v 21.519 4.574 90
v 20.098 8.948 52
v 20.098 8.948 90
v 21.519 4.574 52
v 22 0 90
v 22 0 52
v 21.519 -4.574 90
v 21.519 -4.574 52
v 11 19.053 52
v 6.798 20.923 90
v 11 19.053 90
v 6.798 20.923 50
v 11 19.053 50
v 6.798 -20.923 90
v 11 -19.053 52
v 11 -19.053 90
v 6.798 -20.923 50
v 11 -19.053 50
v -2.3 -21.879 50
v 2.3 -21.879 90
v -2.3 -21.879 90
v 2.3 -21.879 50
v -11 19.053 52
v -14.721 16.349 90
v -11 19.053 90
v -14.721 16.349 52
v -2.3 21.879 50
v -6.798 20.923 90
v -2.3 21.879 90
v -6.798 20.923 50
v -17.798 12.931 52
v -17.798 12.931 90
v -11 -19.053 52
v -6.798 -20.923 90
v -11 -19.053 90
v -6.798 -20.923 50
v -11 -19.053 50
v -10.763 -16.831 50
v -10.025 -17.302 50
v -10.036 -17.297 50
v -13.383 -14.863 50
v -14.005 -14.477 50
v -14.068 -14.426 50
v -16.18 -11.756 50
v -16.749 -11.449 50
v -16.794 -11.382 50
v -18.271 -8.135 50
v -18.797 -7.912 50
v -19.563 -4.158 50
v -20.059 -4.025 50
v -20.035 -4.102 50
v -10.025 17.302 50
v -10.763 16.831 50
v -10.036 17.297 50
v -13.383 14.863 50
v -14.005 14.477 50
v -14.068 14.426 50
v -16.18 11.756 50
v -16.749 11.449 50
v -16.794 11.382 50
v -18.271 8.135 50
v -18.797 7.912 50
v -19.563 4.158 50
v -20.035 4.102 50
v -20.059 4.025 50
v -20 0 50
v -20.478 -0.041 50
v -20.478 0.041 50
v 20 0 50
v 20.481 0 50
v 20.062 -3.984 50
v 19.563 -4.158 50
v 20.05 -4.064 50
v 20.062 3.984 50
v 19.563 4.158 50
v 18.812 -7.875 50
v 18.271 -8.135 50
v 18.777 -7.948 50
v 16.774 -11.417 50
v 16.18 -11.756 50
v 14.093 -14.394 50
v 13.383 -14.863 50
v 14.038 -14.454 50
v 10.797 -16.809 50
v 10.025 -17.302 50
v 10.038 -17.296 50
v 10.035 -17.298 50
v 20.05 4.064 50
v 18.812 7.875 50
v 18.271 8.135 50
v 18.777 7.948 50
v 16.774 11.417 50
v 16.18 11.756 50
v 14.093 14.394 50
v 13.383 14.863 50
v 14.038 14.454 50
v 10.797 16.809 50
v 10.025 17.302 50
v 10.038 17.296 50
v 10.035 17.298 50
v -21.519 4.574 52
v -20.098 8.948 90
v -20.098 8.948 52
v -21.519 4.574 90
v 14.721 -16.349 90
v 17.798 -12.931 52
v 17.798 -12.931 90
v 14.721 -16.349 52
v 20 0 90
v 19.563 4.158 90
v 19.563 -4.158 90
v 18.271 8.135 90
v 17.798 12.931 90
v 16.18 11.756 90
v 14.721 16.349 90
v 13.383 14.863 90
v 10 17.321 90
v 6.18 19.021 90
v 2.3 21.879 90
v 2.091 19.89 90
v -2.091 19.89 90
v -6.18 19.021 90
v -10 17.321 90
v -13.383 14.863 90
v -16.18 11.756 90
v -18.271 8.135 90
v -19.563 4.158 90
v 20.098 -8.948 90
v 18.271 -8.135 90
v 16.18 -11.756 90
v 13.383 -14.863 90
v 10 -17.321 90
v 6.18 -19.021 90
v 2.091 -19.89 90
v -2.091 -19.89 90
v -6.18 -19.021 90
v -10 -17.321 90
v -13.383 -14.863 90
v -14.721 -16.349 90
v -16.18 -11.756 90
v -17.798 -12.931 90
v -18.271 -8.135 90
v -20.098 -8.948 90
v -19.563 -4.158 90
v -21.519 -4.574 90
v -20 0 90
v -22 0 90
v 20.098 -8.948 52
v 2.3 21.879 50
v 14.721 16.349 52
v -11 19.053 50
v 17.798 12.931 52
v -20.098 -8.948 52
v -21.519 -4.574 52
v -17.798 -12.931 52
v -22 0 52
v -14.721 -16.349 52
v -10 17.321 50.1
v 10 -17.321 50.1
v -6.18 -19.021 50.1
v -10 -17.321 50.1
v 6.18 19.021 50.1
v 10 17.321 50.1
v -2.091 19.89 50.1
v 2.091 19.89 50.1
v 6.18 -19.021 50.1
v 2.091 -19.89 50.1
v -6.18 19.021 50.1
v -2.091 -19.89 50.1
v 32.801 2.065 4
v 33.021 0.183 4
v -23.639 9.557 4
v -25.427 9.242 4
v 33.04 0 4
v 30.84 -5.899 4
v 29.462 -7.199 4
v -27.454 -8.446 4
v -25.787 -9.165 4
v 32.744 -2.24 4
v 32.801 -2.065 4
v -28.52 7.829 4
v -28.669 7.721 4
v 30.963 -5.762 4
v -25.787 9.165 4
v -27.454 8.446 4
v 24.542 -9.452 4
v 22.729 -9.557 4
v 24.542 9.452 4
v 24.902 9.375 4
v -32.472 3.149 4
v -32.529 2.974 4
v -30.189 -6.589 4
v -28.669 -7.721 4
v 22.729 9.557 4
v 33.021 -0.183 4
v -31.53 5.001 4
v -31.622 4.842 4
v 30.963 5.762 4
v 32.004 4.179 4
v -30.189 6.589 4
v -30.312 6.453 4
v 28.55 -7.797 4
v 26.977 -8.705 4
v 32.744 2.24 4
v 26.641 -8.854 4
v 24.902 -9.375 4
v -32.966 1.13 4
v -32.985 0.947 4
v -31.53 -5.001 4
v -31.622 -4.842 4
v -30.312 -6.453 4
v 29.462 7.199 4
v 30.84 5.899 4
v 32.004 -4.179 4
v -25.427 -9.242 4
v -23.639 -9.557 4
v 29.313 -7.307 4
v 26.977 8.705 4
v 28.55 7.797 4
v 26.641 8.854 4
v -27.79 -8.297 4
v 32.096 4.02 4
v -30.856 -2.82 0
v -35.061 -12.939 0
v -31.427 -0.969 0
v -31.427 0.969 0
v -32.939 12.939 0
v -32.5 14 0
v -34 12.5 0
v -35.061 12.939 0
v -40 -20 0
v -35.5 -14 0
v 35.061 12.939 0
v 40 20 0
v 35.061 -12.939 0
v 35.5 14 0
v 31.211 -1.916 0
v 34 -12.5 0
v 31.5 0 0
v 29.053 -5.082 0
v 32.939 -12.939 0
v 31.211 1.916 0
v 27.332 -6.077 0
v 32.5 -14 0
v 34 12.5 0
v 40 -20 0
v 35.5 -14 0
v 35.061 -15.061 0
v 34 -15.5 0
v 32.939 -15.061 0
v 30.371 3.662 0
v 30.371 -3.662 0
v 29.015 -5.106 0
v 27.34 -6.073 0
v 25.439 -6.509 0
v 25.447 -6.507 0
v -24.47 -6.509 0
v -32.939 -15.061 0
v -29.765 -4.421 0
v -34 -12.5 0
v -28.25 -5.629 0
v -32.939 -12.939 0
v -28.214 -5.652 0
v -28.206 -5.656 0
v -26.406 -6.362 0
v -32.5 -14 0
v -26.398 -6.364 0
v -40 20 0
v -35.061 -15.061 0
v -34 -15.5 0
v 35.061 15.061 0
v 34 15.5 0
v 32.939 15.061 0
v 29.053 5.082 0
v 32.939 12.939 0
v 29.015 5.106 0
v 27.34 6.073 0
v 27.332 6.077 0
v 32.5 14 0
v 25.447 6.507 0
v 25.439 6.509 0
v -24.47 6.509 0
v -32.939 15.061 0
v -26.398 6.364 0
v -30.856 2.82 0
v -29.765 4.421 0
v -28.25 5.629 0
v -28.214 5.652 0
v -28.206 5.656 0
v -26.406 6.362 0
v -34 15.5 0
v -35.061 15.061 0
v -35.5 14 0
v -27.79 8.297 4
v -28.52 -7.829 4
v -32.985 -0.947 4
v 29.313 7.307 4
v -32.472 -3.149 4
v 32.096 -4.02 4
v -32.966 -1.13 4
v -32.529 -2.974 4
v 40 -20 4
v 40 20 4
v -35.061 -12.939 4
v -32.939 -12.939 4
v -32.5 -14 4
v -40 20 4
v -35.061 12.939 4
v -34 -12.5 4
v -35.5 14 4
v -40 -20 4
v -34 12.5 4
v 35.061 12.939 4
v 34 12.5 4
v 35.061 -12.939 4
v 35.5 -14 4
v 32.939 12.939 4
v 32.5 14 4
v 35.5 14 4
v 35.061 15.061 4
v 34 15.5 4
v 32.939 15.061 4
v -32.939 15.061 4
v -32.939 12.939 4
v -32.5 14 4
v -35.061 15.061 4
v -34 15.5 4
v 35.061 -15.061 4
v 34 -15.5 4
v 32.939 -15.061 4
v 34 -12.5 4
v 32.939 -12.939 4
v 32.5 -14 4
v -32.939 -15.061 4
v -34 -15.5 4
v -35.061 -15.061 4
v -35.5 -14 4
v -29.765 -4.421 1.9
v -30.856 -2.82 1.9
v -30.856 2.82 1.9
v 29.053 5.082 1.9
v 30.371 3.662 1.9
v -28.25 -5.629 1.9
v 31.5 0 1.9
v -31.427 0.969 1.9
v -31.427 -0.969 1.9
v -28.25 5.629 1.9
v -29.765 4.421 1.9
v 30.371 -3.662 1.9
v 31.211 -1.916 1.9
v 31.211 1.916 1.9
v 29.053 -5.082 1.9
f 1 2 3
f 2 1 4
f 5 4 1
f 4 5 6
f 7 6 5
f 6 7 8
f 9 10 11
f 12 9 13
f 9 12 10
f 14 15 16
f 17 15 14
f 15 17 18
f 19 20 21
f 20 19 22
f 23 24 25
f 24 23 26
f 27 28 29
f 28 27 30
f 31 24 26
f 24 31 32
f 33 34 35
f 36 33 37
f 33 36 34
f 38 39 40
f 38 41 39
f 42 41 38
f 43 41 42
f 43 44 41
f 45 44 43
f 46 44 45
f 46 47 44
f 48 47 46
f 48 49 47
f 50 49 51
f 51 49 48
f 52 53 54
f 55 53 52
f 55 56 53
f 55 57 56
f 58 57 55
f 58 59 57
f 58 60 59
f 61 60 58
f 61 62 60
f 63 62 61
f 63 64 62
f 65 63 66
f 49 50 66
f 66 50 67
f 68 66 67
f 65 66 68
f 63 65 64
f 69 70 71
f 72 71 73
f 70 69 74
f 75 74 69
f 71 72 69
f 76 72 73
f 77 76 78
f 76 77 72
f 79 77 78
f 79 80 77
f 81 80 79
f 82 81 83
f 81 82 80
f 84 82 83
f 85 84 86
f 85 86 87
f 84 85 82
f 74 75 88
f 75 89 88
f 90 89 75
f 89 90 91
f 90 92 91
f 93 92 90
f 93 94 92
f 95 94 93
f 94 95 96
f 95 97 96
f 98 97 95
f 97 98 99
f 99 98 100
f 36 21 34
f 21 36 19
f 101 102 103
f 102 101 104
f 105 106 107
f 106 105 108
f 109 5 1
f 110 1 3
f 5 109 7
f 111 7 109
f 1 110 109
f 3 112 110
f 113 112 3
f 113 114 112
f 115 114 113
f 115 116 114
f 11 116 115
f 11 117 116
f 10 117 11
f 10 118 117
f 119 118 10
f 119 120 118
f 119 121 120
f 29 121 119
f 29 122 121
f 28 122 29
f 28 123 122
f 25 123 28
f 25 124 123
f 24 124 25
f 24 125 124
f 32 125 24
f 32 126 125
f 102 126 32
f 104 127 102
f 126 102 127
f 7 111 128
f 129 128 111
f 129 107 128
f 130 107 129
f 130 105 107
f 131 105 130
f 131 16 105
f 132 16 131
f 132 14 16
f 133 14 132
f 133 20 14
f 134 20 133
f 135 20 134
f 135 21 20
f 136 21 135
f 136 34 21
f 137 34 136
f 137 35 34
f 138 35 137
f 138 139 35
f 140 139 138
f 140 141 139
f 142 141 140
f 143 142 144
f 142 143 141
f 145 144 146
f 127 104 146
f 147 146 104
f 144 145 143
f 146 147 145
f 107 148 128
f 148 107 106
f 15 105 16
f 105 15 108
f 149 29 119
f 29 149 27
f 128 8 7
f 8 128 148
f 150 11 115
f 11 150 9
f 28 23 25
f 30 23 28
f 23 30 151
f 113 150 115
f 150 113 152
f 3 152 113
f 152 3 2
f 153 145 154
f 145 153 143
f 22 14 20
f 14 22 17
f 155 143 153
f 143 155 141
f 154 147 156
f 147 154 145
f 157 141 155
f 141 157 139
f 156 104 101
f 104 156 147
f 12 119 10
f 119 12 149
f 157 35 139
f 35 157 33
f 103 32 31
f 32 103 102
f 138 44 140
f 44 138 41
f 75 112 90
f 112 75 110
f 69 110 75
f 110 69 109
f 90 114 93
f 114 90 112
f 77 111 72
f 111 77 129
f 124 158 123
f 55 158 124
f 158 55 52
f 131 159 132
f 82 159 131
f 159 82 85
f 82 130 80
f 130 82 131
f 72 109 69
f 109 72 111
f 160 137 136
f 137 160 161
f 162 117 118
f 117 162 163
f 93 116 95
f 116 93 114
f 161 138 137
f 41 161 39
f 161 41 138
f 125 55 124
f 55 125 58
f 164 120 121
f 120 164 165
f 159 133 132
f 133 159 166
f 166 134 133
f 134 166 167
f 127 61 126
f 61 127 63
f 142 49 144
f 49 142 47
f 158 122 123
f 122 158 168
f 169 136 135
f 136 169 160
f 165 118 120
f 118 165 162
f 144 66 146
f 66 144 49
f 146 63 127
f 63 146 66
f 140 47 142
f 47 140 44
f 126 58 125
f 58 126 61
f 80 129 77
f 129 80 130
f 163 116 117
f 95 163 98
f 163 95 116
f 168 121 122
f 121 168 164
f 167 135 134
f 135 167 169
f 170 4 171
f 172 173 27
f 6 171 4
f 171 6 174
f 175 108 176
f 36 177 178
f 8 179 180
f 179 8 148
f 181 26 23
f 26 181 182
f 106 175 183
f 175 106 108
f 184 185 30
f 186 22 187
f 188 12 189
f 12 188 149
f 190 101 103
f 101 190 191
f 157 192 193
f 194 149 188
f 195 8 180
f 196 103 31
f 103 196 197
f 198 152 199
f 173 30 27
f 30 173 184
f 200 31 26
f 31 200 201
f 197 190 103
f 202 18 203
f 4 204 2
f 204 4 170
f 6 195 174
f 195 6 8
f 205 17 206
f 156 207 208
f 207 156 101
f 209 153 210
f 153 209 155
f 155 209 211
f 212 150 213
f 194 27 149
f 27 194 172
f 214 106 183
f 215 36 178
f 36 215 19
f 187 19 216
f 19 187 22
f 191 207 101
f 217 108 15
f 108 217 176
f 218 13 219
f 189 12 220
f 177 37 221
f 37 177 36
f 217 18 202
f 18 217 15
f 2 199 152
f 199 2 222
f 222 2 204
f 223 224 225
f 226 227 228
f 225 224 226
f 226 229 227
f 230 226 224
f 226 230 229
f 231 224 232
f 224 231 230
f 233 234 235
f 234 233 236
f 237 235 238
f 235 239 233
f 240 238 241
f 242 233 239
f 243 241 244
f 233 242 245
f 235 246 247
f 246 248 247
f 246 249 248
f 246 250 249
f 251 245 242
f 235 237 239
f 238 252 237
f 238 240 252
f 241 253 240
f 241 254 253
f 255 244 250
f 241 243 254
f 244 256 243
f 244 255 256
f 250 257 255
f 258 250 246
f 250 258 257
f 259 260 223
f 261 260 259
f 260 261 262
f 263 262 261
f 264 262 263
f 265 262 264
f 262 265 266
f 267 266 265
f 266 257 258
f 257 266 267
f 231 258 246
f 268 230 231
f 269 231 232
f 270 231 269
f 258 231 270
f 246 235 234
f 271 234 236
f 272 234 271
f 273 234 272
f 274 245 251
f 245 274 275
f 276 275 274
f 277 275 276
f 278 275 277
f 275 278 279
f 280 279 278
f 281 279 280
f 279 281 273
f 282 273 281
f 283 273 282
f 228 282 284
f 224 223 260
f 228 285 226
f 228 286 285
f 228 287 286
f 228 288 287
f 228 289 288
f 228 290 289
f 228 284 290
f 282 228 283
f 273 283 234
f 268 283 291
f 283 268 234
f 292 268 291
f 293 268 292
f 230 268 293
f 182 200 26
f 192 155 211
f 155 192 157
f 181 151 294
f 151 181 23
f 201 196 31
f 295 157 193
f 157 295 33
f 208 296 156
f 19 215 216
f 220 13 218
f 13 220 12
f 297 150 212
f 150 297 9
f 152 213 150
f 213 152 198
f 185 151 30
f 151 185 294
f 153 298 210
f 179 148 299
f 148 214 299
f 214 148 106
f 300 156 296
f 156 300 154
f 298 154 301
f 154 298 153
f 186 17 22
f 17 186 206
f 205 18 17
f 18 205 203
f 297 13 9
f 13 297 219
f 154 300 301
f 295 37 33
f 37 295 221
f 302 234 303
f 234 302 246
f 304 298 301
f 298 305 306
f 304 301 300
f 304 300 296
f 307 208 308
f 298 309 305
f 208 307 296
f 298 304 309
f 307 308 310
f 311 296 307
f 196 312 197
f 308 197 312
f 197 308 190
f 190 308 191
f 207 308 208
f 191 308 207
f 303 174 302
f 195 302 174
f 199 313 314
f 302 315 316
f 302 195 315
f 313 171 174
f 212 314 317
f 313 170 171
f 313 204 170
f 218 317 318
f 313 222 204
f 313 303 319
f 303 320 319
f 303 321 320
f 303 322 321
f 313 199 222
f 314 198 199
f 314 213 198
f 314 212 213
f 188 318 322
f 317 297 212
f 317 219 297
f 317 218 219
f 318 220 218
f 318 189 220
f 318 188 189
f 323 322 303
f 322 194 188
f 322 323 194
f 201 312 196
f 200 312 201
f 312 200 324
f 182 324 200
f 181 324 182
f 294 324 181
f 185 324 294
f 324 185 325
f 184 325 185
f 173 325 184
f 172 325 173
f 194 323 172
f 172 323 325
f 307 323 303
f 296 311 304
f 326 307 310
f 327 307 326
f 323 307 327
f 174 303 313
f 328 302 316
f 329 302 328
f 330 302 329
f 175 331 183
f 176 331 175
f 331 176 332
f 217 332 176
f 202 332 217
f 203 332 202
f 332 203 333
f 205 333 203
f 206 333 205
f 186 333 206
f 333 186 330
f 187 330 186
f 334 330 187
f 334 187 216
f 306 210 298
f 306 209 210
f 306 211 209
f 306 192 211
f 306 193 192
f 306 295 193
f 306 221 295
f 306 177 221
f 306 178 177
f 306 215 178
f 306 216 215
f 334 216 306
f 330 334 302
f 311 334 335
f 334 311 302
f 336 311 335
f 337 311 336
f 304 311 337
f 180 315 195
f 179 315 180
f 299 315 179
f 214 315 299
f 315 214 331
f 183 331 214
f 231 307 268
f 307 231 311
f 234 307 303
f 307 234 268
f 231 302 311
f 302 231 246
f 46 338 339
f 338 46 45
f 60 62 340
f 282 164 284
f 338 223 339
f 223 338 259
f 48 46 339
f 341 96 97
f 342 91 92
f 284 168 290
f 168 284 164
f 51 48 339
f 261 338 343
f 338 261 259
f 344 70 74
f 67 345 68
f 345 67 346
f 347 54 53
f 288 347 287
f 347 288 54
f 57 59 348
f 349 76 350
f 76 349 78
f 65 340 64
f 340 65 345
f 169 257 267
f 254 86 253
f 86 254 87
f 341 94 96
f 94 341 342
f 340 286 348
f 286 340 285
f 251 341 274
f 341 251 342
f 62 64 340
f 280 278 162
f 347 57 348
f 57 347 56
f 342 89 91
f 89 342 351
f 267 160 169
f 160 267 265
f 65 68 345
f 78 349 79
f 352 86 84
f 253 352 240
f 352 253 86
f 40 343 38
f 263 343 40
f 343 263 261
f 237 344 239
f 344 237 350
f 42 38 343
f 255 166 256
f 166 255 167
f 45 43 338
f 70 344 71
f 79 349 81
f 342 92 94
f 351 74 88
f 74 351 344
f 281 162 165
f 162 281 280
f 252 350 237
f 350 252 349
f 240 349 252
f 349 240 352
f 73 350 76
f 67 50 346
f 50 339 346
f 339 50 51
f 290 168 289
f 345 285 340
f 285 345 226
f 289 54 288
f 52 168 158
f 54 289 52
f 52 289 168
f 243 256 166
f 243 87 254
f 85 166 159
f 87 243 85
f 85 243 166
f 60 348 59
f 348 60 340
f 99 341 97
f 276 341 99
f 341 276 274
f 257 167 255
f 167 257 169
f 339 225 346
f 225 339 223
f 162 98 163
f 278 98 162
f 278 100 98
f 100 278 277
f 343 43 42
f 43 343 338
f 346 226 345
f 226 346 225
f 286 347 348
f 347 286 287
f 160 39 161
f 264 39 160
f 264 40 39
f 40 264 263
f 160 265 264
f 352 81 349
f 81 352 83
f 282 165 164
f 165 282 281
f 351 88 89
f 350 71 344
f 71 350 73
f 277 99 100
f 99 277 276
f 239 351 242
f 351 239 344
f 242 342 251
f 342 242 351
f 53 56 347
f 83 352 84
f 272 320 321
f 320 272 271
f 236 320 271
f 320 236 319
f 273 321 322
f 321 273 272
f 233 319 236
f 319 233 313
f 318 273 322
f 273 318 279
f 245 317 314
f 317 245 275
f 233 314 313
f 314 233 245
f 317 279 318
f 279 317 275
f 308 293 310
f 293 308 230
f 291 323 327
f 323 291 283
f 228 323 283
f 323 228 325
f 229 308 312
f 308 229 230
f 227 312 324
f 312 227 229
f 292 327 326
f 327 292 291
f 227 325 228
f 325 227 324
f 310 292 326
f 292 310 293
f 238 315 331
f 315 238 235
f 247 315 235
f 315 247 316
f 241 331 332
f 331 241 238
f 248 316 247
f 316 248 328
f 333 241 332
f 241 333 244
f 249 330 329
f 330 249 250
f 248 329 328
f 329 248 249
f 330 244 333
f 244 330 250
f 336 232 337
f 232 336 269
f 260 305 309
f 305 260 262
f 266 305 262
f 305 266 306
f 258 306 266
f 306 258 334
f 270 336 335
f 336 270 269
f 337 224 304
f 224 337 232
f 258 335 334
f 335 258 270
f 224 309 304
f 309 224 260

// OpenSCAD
hose_inner = 40;
hose_length = 40;
wall_thickness = 2;

clamp_inner = 13;
clamp_width = 50;
cone_height = 50;

plate_width = 40;
plate_length = 80;

hole_margin = 6;

translate([0,0,cone_height])
  difference() {
    cylinder(r=hose_inner/2+wall_thickness, h=hose_length);
    translate([0,0,-0.1]) cylinder(r=hose_inner/2, h=hose_length+0.2);
  }

difference() {
  union() {
    hull() {
      translate([0,0,cone_height])cylinder(r=hose_inner/2+wall_thickness, h=2);
      translate([-clamp_width/2, 0, 0]) cylinder(r=clamp_inner/2+wall_thickness, h=2);
      translate([clamp_width/2, 0, 0]) cylinder(r=clamp_inner/2+wall_thickness, h=2);
    }
    translate([0,0,2]) cube([plate_length,plate_width,4], center=true);
  }
  hull() {
    translate([0,0,cone_height+0.1]) cylinder(r=hose_inner/2, h=2);
    translate([-clamp_width/2, 0, -0.1]) cylinder(r=clamp_inner/2, h=2);
    translate([clamp_width/2, 0, -0.1]) cylinder(r=clamp_inner/2, h=2);
  }
  translate([plate_length/2-hole_margin,plate_width/2-hole_margin,0]) cylinder(r=1.5, h=10, center=true, $fn=8);
  translate([-(plate_length/2-hole_margin),plate_width/2-hole_margin,0]) cylinder(r=1.5, h=10, center=true, $fn=8);
  translate([plate_length/2-hole_margin,-(plate_width/2-hole_margin),0]) cylinder(r=1.5, h=10, center=true, $fn=8);
  translate([-(plate_length/2-hole_margin),-(plate_width/2-hole_margin),0]) cylinder(r=1.5, h=10, center=true, $fn=8);
}
